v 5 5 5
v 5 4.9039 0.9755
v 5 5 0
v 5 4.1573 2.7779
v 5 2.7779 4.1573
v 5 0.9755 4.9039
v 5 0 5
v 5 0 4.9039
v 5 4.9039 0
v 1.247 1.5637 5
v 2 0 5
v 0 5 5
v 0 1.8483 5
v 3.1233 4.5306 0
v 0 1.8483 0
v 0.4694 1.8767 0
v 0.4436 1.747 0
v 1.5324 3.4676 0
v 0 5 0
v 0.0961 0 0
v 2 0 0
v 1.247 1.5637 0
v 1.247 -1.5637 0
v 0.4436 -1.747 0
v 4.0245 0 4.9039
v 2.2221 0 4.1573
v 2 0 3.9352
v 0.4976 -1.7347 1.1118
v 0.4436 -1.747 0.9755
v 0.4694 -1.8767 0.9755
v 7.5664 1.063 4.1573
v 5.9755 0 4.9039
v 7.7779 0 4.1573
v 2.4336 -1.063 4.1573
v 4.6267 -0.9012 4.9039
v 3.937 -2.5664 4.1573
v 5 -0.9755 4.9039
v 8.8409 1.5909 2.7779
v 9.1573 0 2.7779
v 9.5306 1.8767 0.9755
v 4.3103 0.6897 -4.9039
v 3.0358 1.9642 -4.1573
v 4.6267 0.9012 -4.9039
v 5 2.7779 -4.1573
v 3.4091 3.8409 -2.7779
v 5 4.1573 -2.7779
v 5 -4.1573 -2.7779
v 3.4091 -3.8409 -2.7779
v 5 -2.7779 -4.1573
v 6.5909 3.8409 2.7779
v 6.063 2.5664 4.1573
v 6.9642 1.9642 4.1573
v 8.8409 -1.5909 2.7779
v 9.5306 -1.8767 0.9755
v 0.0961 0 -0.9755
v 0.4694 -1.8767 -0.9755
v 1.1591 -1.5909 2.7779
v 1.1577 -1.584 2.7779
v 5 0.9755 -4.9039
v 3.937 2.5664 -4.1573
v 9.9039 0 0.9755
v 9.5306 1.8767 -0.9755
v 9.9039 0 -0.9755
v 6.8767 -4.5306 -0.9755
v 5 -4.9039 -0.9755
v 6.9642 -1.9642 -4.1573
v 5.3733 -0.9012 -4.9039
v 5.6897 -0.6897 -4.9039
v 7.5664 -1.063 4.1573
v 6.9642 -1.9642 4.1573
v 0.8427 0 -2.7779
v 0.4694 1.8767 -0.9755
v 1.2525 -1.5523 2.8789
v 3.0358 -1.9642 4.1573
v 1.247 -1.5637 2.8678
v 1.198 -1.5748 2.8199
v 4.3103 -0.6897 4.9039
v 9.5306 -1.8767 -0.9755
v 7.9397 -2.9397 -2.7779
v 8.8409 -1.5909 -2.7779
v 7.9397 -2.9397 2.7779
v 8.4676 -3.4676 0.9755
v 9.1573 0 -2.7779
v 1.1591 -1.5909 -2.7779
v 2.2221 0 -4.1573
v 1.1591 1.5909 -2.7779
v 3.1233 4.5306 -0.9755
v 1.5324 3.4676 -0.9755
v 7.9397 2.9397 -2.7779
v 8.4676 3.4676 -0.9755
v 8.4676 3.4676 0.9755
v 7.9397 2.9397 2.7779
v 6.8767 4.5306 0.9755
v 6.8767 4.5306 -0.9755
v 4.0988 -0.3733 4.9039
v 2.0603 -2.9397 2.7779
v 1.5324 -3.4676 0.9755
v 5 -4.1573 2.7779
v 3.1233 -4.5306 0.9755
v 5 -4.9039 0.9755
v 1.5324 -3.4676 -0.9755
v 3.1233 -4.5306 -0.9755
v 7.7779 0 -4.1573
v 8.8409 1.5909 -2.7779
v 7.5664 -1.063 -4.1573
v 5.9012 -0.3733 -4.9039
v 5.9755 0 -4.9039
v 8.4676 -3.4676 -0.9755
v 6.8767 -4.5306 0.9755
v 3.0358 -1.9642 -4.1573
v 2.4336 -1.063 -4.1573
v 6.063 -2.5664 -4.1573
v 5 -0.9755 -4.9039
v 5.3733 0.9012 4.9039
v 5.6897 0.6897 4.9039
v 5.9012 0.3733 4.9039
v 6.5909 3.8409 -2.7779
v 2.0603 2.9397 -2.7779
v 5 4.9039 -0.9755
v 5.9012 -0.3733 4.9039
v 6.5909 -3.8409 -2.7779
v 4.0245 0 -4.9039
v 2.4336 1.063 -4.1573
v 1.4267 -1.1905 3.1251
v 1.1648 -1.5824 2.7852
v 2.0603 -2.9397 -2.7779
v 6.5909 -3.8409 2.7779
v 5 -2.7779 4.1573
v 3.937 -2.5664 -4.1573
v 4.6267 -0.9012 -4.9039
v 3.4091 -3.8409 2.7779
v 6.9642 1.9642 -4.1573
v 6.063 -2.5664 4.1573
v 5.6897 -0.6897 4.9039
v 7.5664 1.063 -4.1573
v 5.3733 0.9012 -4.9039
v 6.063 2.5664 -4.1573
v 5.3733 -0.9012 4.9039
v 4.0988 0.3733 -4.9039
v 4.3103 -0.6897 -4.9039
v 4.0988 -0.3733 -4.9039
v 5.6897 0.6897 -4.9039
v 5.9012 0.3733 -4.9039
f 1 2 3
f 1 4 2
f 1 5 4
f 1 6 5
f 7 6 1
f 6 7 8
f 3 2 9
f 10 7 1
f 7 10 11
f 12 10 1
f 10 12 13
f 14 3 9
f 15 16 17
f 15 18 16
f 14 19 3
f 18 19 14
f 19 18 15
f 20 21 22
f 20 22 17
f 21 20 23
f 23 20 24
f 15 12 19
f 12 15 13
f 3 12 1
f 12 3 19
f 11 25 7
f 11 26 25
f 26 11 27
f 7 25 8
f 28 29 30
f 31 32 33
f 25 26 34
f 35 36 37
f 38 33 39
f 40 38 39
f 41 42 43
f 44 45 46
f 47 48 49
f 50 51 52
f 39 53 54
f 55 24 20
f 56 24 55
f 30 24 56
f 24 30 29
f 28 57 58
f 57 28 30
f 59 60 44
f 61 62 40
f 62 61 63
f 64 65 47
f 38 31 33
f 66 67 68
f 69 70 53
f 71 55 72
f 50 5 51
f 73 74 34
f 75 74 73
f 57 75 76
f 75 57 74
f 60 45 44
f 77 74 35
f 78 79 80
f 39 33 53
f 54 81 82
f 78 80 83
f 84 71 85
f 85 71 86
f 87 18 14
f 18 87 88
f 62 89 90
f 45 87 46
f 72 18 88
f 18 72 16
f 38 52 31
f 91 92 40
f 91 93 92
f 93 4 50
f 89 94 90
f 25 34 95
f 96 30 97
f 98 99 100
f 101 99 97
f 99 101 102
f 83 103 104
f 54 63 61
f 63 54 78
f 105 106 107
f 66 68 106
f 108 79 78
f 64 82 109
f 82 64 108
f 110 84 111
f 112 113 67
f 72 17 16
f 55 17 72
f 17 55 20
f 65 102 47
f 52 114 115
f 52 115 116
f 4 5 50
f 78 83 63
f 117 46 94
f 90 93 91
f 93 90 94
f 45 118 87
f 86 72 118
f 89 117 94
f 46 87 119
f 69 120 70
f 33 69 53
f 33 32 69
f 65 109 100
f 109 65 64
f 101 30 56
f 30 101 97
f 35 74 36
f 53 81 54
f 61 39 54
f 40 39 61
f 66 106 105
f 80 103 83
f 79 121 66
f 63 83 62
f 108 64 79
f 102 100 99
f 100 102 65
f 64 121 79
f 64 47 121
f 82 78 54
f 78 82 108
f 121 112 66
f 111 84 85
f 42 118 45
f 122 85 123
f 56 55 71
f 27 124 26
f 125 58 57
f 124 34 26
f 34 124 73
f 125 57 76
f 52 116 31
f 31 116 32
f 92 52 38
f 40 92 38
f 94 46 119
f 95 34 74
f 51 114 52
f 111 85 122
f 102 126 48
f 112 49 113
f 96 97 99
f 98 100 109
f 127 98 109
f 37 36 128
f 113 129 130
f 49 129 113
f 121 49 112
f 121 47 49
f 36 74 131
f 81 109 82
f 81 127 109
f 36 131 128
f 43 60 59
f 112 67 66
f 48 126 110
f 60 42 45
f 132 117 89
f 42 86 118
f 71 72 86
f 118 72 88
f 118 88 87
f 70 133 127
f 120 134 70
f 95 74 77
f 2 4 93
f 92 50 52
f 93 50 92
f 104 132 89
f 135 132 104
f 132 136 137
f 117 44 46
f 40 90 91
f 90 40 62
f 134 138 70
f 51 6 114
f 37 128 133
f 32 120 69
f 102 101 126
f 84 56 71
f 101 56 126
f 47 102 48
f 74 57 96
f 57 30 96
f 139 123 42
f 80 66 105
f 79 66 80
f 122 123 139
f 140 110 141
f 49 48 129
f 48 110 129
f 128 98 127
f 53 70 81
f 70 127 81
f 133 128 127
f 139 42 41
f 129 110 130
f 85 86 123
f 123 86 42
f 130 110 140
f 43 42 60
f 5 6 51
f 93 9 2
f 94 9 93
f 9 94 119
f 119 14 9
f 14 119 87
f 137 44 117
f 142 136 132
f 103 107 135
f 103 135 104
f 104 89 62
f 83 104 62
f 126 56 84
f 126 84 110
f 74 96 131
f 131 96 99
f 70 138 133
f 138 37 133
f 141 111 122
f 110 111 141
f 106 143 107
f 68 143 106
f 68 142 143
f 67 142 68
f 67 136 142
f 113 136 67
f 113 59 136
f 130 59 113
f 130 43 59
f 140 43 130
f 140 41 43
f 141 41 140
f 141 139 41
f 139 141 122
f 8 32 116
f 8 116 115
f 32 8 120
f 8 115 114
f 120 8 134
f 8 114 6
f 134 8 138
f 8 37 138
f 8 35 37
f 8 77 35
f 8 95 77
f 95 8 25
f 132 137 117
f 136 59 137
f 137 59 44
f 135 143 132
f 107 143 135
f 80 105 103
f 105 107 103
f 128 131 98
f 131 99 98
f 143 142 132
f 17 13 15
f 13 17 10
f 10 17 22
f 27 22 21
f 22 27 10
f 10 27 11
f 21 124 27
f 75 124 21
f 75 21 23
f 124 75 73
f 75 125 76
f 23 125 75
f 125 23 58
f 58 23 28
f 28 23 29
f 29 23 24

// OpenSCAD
difference() {
	union() {
		cube(size = 5);
		translate(v = [5, 0, 0]) {
			sphere(r = 5);
		}
	}
	cylinder(h = 6, r = 2);
}
/***********************************************
*********      SolidPython code:      **********
************************************************
 
from solid import *
from solid.utils import *  # Not required, but the utils module is useful

d = cube(5) + right(5)(sphere(5)) - cylinder(r=2, h=6)
scad_render_to_file(d, "../scad/" + __file__ + ".scad")
 
 
************************************************/
